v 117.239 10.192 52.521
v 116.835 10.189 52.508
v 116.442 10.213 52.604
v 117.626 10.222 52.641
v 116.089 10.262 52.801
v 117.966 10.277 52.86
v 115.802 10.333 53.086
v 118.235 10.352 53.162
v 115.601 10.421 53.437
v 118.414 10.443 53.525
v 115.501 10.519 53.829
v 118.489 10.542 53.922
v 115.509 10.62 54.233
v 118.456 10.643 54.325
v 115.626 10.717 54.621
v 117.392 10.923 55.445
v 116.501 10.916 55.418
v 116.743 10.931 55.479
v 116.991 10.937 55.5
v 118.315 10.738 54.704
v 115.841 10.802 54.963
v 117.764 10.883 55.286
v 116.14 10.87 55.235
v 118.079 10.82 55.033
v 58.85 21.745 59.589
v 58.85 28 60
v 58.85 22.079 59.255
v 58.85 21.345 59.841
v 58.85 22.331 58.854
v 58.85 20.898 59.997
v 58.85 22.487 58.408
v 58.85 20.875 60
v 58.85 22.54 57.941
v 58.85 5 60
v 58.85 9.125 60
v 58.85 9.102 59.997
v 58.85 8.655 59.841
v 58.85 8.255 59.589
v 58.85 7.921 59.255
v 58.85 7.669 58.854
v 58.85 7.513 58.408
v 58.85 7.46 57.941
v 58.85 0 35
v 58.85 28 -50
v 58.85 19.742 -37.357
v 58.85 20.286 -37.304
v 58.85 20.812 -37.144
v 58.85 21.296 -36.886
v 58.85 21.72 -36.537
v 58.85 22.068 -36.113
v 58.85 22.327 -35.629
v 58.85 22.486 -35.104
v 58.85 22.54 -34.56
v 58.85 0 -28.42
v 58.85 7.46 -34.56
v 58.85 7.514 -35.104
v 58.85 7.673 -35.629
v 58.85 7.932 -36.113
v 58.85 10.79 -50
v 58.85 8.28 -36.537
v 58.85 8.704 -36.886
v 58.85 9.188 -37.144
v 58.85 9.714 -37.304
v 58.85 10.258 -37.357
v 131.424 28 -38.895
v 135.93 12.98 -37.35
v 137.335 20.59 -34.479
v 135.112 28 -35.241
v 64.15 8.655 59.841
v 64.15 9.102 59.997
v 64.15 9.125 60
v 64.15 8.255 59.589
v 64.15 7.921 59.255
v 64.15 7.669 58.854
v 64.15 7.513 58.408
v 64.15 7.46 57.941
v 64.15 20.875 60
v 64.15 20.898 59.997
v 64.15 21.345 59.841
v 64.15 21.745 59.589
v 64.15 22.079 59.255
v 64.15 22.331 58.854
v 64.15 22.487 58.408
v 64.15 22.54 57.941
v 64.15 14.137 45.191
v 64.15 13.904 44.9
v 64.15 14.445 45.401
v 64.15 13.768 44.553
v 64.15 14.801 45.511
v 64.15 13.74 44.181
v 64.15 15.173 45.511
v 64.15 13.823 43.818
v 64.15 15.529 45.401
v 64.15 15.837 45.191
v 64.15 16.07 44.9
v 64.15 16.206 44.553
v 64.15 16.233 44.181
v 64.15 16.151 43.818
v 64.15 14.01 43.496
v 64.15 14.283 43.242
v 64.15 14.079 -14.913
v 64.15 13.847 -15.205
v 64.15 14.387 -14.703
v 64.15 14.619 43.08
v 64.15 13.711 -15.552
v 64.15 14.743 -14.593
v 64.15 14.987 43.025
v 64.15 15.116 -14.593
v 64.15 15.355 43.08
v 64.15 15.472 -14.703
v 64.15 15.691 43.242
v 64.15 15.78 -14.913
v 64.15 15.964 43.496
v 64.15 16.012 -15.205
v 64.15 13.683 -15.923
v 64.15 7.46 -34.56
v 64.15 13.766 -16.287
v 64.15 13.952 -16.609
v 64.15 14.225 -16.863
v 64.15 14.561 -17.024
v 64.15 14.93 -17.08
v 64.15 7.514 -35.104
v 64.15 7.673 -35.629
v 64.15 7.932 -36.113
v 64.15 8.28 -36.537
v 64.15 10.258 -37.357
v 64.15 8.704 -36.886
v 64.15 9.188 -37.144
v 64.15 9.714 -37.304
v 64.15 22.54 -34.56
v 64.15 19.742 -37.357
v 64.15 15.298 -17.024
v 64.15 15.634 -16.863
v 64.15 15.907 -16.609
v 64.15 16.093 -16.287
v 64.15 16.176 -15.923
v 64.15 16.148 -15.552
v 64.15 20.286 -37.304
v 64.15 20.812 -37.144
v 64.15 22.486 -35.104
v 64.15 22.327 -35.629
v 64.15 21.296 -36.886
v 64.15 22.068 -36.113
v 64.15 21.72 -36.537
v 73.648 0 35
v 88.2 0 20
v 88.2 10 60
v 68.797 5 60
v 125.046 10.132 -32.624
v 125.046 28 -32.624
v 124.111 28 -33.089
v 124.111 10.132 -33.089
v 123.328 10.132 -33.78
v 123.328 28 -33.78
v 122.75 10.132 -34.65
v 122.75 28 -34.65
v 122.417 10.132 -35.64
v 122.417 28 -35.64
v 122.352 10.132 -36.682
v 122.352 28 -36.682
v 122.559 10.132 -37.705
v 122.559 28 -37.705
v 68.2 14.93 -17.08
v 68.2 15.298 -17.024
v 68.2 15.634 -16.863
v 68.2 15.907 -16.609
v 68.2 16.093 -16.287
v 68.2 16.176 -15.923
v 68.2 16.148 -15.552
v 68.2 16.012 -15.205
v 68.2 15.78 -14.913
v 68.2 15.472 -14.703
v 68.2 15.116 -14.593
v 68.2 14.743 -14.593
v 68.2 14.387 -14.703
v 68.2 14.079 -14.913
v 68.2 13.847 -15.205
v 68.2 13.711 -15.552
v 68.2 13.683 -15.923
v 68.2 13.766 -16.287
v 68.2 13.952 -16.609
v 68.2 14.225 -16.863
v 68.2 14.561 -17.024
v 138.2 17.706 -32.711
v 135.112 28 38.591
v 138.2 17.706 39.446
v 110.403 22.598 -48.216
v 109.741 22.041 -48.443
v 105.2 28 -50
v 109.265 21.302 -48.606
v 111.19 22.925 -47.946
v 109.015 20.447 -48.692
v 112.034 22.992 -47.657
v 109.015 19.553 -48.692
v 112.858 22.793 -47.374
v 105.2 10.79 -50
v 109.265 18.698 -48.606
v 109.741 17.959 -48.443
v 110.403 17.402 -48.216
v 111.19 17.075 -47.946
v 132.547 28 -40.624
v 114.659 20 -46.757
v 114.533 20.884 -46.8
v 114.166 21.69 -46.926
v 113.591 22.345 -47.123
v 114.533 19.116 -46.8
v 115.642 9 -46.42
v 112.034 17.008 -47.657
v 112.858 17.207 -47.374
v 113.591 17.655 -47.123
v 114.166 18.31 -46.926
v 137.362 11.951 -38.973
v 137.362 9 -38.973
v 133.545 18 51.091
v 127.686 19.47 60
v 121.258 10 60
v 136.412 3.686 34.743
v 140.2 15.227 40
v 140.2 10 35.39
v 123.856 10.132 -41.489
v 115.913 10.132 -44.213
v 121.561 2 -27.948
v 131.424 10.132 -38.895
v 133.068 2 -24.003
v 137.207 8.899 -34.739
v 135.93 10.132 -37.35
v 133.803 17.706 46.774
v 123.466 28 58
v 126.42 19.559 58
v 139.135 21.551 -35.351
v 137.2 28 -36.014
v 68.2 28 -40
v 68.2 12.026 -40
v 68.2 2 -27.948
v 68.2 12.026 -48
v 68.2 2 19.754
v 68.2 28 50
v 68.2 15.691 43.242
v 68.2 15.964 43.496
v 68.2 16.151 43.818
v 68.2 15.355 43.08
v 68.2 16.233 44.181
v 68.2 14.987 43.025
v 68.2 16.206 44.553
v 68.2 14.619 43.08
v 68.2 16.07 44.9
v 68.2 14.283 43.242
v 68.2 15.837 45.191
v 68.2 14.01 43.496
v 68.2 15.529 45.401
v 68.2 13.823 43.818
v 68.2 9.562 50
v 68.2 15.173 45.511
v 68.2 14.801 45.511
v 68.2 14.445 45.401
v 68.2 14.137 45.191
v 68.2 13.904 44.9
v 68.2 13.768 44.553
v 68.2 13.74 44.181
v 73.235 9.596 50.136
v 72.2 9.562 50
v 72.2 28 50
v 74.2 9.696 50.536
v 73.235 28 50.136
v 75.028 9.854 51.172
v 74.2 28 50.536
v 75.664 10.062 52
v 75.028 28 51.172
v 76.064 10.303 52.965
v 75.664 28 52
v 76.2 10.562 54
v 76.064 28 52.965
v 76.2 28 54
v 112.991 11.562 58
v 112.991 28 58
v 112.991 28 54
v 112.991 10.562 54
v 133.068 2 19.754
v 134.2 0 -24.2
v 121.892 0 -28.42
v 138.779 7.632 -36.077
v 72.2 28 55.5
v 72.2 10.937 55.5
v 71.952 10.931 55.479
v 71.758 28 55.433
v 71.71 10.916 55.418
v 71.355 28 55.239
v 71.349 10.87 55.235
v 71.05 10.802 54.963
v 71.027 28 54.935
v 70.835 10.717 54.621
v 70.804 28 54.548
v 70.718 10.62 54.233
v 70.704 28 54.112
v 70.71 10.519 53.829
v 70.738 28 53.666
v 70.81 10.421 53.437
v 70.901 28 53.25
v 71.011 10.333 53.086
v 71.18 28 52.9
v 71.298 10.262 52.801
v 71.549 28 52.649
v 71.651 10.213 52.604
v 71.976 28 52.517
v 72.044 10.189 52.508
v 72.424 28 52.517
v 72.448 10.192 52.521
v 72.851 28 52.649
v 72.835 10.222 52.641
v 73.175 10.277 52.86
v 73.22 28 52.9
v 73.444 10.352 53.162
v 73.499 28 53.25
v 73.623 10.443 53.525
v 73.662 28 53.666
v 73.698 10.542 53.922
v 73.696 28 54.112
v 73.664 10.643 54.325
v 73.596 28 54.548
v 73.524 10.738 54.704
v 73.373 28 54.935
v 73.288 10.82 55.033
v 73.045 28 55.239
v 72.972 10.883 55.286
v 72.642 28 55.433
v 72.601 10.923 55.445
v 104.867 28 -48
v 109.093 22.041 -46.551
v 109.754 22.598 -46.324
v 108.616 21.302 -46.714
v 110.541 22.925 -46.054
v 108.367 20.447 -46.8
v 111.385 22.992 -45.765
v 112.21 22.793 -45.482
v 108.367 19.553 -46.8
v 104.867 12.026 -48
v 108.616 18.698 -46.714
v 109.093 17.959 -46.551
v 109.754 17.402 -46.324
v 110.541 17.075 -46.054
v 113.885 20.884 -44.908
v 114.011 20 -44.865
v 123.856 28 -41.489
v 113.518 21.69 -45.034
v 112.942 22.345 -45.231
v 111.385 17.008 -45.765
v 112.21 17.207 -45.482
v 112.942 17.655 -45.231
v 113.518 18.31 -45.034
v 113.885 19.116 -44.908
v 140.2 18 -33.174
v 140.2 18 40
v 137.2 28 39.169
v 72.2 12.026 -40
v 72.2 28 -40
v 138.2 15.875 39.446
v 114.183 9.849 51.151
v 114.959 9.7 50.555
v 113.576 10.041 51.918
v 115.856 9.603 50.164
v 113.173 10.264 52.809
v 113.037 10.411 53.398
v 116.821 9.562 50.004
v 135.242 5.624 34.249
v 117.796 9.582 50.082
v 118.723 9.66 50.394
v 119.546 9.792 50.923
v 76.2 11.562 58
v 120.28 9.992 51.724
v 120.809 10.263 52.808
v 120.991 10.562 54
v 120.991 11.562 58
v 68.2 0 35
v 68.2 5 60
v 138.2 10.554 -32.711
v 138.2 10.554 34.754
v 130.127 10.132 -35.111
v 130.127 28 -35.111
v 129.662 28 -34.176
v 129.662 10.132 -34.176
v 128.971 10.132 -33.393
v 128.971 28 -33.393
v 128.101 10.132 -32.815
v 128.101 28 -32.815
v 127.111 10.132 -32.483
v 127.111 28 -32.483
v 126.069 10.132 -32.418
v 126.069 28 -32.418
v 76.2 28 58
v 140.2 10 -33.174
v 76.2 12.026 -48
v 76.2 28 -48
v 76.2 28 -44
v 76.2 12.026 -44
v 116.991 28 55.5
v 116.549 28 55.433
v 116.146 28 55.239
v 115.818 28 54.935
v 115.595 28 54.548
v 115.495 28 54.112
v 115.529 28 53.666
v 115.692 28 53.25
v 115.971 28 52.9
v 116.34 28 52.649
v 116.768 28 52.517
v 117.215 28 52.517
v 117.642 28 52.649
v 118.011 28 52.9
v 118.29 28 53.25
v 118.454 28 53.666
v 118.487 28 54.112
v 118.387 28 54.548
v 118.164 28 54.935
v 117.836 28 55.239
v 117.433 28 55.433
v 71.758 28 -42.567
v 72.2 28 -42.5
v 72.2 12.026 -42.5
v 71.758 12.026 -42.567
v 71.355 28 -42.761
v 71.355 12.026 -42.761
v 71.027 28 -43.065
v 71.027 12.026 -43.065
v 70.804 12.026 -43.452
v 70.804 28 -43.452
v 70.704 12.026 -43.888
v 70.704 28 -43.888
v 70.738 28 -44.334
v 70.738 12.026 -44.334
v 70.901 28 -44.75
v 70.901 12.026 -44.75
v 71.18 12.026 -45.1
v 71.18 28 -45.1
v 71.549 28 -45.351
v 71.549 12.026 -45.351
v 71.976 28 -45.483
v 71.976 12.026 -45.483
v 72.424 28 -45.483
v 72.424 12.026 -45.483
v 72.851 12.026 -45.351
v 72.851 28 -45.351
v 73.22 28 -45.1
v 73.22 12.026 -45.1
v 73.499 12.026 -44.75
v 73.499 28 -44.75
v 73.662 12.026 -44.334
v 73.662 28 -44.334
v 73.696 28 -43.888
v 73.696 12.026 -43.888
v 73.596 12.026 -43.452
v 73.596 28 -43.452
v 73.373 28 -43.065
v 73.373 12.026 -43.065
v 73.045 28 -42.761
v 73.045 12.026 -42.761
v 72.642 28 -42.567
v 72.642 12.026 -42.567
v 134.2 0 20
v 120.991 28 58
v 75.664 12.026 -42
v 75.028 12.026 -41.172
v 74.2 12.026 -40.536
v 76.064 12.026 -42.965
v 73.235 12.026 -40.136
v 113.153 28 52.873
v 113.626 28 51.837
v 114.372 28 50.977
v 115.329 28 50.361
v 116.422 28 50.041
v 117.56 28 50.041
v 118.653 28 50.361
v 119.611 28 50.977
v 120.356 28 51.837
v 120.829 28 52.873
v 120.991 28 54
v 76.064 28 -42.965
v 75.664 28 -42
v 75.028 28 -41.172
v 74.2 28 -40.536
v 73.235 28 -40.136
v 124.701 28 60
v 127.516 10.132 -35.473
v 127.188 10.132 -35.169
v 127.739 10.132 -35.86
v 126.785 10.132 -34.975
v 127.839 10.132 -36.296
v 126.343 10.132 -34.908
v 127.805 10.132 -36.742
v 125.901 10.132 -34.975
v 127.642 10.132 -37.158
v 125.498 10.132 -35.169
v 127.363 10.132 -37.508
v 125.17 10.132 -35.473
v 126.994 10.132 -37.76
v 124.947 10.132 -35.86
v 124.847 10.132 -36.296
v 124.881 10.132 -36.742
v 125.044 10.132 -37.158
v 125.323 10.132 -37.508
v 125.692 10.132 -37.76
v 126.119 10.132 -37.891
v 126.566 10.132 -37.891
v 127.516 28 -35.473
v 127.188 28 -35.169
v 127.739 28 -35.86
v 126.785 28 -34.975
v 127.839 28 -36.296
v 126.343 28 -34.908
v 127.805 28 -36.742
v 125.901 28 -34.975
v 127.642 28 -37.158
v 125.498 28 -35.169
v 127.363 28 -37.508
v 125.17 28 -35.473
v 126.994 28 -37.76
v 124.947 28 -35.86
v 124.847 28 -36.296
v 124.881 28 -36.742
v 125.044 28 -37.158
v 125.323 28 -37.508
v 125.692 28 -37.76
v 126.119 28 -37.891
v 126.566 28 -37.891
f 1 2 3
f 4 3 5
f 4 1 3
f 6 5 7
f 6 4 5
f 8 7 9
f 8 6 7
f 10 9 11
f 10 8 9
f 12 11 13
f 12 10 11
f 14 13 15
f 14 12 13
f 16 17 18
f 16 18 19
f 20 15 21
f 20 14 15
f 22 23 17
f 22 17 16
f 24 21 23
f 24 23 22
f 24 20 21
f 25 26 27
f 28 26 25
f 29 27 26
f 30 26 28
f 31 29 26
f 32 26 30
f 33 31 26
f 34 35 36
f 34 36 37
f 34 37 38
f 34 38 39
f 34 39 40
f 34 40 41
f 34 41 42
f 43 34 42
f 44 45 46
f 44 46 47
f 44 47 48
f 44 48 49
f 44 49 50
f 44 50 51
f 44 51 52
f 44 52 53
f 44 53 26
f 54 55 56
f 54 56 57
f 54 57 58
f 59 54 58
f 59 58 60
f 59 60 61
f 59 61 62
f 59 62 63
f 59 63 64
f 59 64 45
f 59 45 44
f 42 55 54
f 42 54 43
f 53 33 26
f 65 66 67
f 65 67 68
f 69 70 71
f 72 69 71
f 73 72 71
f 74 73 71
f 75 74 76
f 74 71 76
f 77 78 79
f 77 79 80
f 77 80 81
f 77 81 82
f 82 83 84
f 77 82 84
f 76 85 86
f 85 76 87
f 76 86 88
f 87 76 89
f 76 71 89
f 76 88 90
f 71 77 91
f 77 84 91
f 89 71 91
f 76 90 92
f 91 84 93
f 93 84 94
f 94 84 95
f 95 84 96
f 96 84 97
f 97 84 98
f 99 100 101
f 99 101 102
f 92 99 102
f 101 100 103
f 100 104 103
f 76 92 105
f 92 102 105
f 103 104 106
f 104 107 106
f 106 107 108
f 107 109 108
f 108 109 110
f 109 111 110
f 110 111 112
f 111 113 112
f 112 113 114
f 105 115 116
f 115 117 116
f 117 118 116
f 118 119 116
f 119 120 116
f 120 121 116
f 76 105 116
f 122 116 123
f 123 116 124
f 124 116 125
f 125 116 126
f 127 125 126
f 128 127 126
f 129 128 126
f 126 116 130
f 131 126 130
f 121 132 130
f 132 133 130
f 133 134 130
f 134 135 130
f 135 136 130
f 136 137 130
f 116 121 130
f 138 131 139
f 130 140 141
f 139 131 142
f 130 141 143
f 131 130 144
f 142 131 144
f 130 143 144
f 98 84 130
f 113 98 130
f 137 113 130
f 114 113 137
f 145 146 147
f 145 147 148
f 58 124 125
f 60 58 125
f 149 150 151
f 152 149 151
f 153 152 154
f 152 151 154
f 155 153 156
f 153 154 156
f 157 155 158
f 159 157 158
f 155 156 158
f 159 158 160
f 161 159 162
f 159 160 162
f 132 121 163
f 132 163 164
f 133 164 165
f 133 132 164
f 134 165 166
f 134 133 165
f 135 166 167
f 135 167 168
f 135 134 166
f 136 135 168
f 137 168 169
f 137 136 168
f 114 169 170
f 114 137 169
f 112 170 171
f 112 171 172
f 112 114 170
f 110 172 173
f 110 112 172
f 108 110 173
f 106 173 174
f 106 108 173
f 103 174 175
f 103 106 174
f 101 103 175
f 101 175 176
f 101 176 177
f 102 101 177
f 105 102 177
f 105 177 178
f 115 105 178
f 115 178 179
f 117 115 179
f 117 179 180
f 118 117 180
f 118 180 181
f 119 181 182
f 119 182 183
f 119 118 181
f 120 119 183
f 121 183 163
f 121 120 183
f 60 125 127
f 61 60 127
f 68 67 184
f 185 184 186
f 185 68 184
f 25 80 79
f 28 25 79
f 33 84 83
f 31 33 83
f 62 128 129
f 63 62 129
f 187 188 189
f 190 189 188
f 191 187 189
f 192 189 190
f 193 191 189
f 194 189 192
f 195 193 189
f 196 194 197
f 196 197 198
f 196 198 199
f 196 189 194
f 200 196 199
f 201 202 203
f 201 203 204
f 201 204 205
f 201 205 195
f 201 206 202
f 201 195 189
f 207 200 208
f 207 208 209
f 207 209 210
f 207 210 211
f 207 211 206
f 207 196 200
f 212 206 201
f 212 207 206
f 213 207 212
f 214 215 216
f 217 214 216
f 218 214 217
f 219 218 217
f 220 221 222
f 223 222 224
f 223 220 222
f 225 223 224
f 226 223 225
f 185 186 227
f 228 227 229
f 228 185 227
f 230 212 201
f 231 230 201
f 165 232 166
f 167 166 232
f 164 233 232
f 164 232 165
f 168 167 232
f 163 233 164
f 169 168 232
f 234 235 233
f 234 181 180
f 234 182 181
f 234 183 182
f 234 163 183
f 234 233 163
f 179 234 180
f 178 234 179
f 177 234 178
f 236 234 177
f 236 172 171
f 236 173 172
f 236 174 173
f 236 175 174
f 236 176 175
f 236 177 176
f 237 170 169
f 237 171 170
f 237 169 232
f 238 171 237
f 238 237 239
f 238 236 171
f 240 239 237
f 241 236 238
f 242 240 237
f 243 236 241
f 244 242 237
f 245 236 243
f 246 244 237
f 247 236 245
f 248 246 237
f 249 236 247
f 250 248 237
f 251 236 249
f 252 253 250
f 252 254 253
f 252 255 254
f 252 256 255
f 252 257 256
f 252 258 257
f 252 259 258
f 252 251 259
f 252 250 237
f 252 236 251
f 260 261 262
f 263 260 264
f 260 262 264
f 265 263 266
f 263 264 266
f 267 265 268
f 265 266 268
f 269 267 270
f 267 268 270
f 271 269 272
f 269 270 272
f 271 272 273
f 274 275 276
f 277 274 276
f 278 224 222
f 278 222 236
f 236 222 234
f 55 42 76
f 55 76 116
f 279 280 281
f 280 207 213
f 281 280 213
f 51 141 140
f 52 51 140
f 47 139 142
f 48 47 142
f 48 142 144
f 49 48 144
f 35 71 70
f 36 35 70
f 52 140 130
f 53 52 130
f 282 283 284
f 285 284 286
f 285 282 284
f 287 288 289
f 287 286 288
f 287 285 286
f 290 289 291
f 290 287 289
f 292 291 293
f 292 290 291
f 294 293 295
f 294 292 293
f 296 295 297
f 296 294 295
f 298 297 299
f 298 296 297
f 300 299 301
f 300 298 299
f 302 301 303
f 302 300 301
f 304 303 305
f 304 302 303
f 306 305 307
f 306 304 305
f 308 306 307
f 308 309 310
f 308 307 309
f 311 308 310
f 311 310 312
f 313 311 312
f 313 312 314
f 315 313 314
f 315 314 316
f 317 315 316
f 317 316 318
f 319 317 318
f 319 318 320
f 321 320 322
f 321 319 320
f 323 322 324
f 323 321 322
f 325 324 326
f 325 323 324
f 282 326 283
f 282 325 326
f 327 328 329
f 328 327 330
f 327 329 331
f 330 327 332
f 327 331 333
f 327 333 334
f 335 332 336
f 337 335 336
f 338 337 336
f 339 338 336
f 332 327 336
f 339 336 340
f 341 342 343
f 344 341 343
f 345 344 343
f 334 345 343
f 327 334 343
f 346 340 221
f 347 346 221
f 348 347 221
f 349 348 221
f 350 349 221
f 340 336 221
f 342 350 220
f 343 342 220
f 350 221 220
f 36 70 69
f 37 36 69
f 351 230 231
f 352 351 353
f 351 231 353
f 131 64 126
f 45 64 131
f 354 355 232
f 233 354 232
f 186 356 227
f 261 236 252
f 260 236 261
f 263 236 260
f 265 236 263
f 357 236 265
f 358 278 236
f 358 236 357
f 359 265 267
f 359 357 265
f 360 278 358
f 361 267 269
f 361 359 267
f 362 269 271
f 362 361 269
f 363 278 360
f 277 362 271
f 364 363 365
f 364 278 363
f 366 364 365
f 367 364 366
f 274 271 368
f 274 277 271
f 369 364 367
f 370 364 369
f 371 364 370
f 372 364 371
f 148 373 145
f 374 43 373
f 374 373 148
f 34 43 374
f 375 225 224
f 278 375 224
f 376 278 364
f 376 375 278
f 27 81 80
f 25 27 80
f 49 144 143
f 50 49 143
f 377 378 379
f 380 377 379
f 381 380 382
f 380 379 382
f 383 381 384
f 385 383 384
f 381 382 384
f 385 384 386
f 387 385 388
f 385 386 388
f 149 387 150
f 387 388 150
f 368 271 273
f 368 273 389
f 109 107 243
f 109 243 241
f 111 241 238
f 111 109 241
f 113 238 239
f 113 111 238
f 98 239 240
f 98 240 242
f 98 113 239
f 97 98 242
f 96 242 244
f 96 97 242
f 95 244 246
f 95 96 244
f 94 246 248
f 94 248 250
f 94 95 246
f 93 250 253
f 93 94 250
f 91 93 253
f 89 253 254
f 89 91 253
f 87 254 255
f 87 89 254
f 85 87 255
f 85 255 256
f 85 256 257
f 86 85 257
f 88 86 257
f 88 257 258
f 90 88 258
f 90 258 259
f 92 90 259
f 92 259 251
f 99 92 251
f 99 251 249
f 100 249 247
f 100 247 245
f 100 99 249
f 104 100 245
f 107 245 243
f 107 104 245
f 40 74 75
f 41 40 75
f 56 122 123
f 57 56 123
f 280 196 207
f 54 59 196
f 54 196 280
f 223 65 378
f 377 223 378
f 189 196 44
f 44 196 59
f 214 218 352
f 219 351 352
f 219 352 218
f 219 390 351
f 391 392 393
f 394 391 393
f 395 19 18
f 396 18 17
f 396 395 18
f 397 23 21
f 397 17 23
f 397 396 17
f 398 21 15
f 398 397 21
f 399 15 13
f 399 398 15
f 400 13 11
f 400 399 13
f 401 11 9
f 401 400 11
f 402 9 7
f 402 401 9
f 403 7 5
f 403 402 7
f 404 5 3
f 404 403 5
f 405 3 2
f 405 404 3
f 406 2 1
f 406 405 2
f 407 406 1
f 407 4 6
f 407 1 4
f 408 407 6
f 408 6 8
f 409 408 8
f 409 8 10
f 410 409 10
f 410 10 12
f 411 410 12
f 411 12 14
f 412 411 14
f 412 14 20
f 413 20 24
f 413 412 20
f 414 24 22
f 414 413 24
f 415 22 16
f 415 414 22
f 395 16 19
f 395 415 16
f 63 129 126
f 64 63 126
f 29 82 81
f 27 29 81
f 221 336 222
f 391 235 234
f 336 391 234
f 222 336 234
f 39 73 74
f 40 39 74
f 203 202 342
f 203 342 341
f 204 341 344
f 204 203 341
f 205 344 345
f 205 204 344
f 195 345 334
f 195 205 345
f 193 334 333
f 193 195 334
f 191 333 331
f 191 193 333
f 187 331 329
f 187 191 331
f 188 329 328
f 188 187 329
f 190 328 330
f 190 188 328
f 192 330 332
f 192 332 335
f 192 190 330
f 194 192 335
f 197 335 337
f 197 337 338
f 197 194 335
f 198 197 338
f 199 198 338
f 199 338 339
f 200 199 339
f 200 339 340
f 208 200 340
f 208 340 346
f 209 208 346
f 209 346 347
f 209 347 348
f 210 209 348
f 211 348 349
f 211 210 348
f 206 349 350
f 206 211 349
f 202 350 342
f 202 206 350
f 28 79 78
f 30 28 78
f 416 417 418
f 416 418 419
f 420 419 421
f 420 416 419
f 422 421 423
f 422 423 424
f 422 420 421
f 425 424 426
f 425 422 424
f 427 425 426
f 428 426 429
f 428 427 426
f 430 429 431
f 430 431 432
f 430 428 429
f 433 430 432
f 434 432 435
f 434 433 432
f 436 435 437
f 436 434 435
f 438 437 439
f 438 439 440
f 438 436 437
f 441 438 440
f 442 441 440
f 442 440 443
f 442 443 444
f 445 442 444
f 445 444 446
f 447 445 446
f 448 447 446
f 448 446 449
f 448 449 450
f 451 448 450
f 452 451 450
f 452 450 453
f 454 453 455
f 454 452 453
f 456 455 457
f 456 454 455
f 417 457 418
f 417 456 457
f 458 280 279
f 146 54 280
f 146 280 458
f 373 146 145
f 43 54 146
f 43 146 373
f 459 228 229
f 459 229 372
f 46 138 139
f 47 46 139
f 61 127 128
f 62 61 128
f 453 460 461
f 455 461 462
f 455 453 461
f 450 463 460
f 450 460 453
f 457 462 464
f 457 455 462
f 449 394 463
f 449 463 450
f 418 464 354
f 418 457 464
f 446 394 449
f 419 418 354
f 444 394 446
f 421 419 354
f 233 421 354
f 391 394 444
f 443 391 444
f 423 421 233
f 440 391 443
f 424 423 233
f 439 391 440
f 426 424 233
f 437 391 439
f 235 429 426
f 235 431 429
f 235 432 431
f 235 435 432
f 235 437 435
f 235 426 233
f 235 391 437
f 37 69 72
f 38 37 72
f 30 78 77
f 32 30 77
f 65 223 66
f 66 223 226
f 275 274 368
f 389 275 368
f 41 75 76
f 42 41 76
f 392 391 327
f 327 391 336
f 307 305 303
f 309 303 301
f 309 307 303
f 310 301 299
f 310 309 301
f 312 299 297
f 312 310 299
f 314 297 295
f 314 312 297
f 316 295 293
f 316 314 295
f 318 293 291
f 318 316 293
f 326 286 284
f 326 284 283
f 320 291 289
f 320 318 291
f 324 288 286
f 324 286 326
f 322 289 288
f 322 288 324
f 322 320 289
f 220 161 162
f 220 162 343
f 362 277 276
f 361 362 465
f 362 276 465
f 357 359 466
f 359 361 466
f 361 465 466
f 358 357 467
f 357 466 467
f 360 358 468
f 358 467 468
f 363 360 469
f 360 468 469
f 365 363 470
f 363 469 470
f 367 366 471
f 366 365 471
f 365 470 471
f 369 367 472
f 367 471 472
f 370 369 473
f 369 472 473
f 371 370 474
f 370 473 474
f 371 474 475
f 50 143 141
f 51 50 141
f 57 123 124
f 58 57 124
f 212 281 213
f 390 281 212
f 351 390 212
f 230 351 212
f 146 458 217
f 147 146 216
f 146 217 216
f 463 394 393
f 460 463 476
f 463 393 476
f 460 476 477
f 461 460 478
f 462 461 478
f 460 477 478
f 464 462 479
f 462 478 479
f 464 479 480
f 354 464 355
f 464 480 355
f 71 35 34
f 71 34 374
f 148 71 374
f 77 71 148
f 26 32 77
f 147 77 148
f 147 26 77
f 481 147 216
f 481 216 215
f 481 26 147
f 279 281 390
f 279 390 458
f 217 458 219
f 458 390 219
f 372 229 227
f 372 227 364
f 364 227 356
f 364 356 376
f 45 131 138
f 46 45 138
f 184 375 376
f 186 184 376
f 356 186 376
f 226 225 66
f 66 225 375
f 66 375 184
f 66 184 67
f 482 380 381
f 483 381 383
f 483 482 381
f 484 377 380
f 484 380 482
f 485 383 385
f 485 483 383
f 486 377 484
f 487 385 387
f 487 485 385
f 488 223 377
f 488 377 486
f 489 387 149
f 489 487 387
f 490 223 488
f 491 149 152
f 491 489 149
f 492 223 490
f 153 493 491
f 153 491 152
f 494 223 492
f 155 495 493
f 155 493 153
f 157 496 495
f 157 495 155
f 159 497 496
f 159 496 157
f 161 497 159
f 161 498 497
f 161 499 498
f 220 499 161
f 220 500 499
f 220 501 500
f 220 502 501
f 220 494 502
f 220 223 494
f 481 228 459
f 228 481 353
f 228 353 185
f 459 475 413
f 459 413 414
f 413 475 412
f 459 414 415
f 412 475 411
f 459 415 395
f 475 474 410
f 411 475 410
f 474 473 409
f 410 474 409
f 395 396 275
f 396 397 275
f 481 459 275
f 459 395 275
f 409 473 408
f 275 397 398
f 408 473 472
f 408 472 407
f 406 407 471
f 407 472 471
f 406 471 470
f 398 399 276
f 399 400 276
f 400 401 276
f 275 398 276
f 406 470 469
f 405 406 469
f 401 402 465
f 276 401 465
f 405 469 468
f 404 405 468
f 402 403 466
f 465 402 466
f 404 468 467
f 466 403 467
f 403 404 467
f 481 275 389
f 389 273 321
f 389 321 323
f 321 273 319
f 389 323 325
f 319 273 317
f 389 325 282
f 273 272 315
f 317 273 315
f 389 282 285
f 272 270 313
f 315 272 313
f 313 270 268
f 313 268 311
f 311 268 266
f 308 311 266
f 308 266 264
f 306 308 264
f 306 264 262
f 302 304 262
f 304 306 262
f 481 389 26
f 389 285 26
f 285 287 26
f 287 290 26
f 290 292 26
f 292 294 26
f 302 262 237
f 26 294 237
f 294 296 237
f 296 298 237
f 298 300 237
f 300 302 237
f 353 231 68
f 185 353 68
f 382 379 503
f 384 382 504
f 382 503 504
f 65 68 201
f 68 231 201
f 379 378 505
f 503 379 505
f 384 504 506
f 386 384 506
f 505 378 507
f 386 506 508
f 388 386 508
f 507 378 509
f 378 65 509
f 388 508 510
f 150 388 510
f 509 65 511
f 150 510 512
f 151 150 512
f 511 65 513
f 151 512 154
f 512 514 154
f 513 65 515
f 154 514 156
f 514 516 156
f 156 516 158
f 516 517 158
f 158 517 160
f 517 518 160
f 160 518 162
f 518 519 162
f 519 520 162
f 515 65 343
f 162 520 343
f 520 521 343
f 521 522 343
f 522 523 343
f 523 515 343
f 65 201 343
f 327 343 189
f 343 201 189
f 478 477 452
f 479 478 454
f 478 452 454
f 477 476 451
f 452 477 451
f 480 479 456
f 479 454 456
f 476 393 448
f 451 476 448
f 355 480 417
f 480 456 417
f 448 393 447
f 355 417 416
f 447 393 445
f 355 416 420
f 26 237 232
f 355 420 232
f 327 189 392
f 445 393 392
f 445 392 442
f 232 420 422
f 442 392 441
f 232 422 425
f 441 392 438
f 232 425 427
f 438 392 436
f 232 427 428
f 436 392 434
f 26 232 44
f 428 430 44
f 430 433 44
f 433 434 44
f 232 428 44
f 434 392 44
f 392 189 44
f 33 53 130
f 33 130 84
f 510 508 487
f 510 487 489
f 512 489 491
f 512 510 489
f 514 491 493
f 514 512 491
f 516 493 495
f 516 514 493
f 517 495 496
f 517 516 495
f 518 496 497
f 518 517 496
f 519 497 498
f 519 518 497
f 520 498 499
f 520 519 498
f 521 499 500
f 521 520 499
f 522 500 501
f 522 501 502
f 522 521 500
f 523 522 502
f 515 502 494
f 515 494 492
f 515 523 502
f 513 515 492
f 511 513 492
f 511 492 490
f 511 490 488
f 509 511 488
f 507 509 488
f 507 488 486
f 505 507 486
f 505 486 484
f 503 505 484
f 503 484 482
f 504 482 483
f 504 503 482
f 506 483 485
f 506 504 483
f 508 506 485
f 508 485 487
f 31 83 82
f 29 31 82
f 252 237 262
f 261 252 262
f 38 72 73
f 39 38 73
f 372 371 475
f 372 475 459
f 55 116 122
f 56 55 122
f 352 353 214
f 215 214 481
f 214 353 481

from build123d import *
from OCP.BRepFilletAPI import BRepFilletAPI_MakeChamfer

# Parameters (mm, degrees)
SKETCH1_W               = 55
SKETCH1_H               = 60
BOSS_EXTRUDE1_DEPTH     = 28
CHAMFER5_SIZE           = 15
CHAMFER5_SIZE2          = 9
CUT_EXTRUDE3_DEPTH      = 98.816154085
CUT_EXTRUDE5_DEPTH      = 98.816154085
CHAMFER2_SIZE           = 6
CHAMFER2_SIZE2          = 10
CHAMFER2_PART_2_SIZE    = 6
CHAMFER2_PART_2_SIZE2   = 10
CHAMFER3_SIZE           = 10
CHAMFER3_SIZE2          = 3
CHAMFER8_SIZE           = 3
CHAMFER8_SIZE2          = 4.688384964
CHAMFER8_SIZE2_2        = 4.826086957
SHELL1_T                = -2
SKETCH1_3_W             = 9.35
SKETCH1_3_H             = 100
SKETCH1_3_H_2           = 10
BOSS_EXTRUDE2_DEPTH     = 28
CUT_EXTRUDE1_DEPTH      = 5.3
CUT_EXTRUDE_THIN1_DEPTH = 5.3
SKETCH4_R               = 1.250001298
SKETCH4_R_2             = 1.250245712
CUT_EXTRUDE2_DEPTH      = 4.05
CUT_EXTRUDE4_DEPTH      = 9.35
CUT_EXTRUDE6_DEPTH      = 98.816154085
CHAMFER6_SIZE           = 20
CHAMFER6_SIZE_2         = 5
SKETCH10_R              = 3
CUT_EXTRUDE7_DEPTH      = 2
SKETCH12_R              = 1.5
BOSS_EXTRUDE3_DEPTH     = 18.45
SKETCH12_4_R            = 1.5
BOSS_EXTRUDE4_DEPTH     = 15.973931
SKETCH12_5_R            = 1.5
BOSS_EXTRUDE5_DEPTH     = 17.86762


with BuildPart() as part:
    # Sketch1 → Boss-Extrude1 (new body)
    # profile 1 of 2: a face of its own
    with BuildSketch(Plane(origin=(0, 0, 0), x_dir=(1, 0, 0), z_dir=(0, 1, 0))):
        Polygon((29.5, 50), (-7.5, 50), (-42.5, 38), (-42.5, -40), (-30.5, -60), (29.5, -60), (29.5, -50), align=None)
        Rectangle(SKETCH1_W, SKETCH1_H, mode=Mode.SUBTRACT)
    # profile 2 of 2: a face of its own
    with BuildSketch(Plane(origin=(0, 0, 0), x_dir=(1, 0, 0), z_dir=(0, 1, 0))):
        Rectangle(SKETCH1_W, SKETCH1_H)
    extrude(amount=BOSS_EXTRUDE1_DEPTH)

    # Chamfer5
    chamfer5_edges = [part.edges().sort_by_distance(p)[0] for p in [
        (-25, 0, -44),
    ]]
    chamfer5_side = [part.faces().sort_by_distance(p)[0] for p in [
        (-5.320816864, 0, 5.646903821),
    ]]
    chamfer(chamfer5_edges, length=CHAMFER5_SIZE, length2=CHAMFER5_SIZE2, reference=chamfer5_side[0])

    # Sketch6 → Cut-Extrude3 (cut, through all)
    with BuildSketch(Plane(origin=(29.5, 0, 0), x_dir=(0, 0, -1), z_dir=(1, 0, 0))):
        Polygon((28.599998808, 0.090000199), (38.599998808, 5.090000199), (50, 10.790000795), (50, 0), (28.41999841, 0), align=None)
    extrude(amount=-CUT_EXTRUDE3_DEPTH, mode=Mode.SUBTRACT)

    # Sketch8 → Cut-Extrude5 (cut, through all)
    with BuildSketch(Plane.ZY.offset(42.5)):
        Polygon((20, 0), (60, 10), (60, 0), align=None)
    extrude(amount=-CUT_EXTRUDE5_DEPTH, mode=Mode.SUBTRACT)

    # Chamfer2
    chamfer2_edges = [part.edges().sort_by_distance(p)[0] for p in [
        (-42.5, 0, -1.071428571),
    ]]
    chamfer2_side = [part.faces().sort_by_distance(p)[0] for p in [
        (-5.998960327, 0, -3.839335876),
    ]]
    chamfer(chamfer2_edges, length=CHAMFER2_SIZE, length2=CHAMFER2_SIZE2, reference=chamfer2_side[0])

    # Chamfer2 part 2
    chamfer2_part_2_edges = [part.edges().sort_by_distance(p)[0] for p in [
        (-36.5, 7.5, 50),
    ]]
    chamfer2_part_2_side = [part.faces().sort_by_distance(p)[0] for p in [
        (-5.108695652, 4.855072464, 39.420289855),
    ]]
    chamfer(chamfer2_part_2_edges, length=CHAMFER2_PART_2_SIZE, length2=CHAMFER2_PART_2_SIZE2, reference=chamfer2_part_2_side[0])

    # Chamfer3: one chamfer whose edges measure the first distance from different faces: ONE call of the kernel's chamfer builder (chamfer() names one face for all edges)
    chamfer3_edges_1 = [part.edges().sort_by_distance(p)[0] for p in [
        (-36.5, 28, 50),
    ]]
    chamfer3_side_1 = [part.faces().sort_by_distance(p)[0] for p in [
        (-36.986722145, 22.762198781, 49.188796426),
    ]]
    chamfer3_edges_2 = [part.edges().sort_by_distance(p)[0] for p in [
        (-42.5, 28, 1),
    ]]
    chamfer3_side_2 = [part.faces().sort_by_distance(p)[0] for p in [
        (-42.5, 19.062821539, 0.675718674),
    ]]
    chamfer3 = BRepFilletAPI_MakeChamfer(part.part.solid().wrapped)
    for e in chamfer3_edges_1:
        chamfer3.Add(CHAMFER3_SIZE, CHAMFER3_SIZE2, e.wrapped, chamfer3_side_1[0].wrapped)  # the first distance lies on this face
    for e in chamfer3_edges_2:
        chamfer3.Add(CHAMFER3_SIZE, CHAMFER3_SIZE2, e.wrapped, chamfer3_side_2[0].wrapped)  # the first distance lies on this face
    add(Compound.cast(chamfer3.Shape()), mode=Mode.REPLACE)

    # Chamfer8: one chamfer whose edges measure the first distance from different faces: ONE call of the kernel's chamfer builder (chamfer() names one face for all edges)
    chamfer8_edges_1 = [part.edges().sort_by_distance(p)[0] for p in [
        (-41, 23, -38.514285714),
    ]]
    chamfer8_side_1 = [part.faces().sort_by_distance(p)[0] for p in [
        (-40.999367405, 23.002108649, 0.534923115),
    ]]
    chamfer8_edges_2 = [part.edges().sort_by_distance(p)[0] for p in [
        (-42.5, 14, -38),
    ]]
    chamfer8_side_2 = [part.faces().sort_by_distance(p)[0] for p in [
        (-24.809989525, 18.489778037, -44.065146449),
    ]]
    chamfer8 = BRepFilletAPI_MakeChamfer(part.part.solid().wrapped)
    for e in chamfer8_edges_1:
        chamfer8.Add(CHAMFER8_SIZE, CHAMFER8_SIZE2, e.wrapped, chamfer8_side_1[0].wrapped)  # the first distance lies on this face
    for e in chamfer8_edges_2:
        chamfer8.Add(CHAMFER8_SIZE, CHAMFER8_SIZE2_2, e.wrapped, chamfer8_side_2[0].wrapped)  # the first distance lies on this face
    add(Compound.cast(chamfer8.Shape()), mode=Mode.REPLACE)

    # Shell1
    shell1_openings = [part.faces().sort_by_distance(p)[0] for p in [
        (-3.850715667, 28, 5.420818652),
        (29.5, 15.210219058, 3.998585691),
    ]]
    offset(amount=SHELL1_T, openings=shell1_openings, kind=Kind.INTERSECTION)

    # Sketch1<3> → Boss-Extrude2 (add)
    with BuildSketch(Plane(origin=(0, 0, 0), x_dir=(1, 0, 0), z_dir=(0, 1, 0))):
        with Locations((34.175, 0)):
            Rectangle(SKETCH1_3_W, SKETCH1_3_H)
        with Locations((34.175, -55)):
            Rectangle(SKETCH1_3_W, SKETCH1_3_H_2)
    extrude(amount=BOSS_EXTRUDE2_DEPTH)

    # Sketch3 → Cut-Extrude1 (cut)
    with BuildSketch(Plane(origin=(38.85, 0, 0), x_dir=(0, 0, -1), z_dir=(1, 0, 0))):
        Polygon((34.557366217, 22.490000211), (-57.938007116, 22.490000211), (-58.396836221, 22.438301563), (-58.832665384, 22.285797958), (-59.223634601, 22.040136716), (-59.550133944, 21.713636209), (-59.795801938, 21.322668447), (-59.948307872, 20.886838382), (-60, 20.4280002), (-60, 9.572000334), (-59.948307872, 9.113161916), (-59.795801938, 8.677331822), (-59.550133944, 8.286364468), (-59.223634601, 7.959863262), (-58.832665384, 7.714202719), (-58.396836221, 7.561698647), (-57.938007116, 7.51), (34.557366217, 7.51), (35.093864598, 7.56284138), (35.609745709, 7.719331512), (36.08518437, 7.973458709), (36.501909895, 8.315457123), (36.84390761, 8.732182065), (37.098034807, 9.207620377), (37.254525637, 9.723501371), (37.307366086, 10.259999985), (37.307366086, 19.740000226), (37.254525637, 20.276498578), (37.098034807, 20.79237963), (36.84390761, 21.267818379), (36.501909895, 21.684543903), (36.08518437, 22.026541618), (35.609745709, 22.280668931), (35.093864598, 22.437159762), align=None)
    extrude(amount=-CUT_EXTRUDE1_DEPTH, mode=Mode.SUBTRACT)

    # Sketch3<2> → Cut-Extrude-Thin1 (cut)
    with BuildSketch(Plane(origin=(38.85, 0, 0), x_dir=(0, 0, -1), z_dir=(1, 0, 0))):
        Polygon((-58.408032741, 22.487356385), (-58.854496816, 22.331131453), (-59.255006355, 22.079475653), (-59.589472678, 21.745008138), (-59.84113526, 21.344500303), (-59.997362817, 20.898034618), (-60.05, 20.430807788), (-60.05, 9.569192748), (-59.997362818, 9.101965682), (-59.841135257, 8.655499956), (-59.589472684, 8.254992553), (-59.255006355, 7.920524316), (-58.854496805, 7.668869226), (-58.408032765, 7.512643829), (-57.940815111, 7.46), (34.559822602, 7.46), (35.103666322, 7.513564845), (35.628972433, 7.672914008), (36.113097308, 7.931684081), (36.537436306, 8.279930722), (36.885682237, 8.704269129), (37.144452294, 9.188393617), (37.303802182, 9.713699658), (37.357366086, 10.257543645), (37.357366086, 19.742456567), (37.303802182, 20.286300291), (37.144452297, 20.811606381), (36.885682251, 21.295731292), (36.537436304, 21.720070312), (36.113097289, 22.068316255), (35.628972465, 22.32708642), (35.103666311, 22.486436306), (34.559822559, 22.540000211), (-57.940815111, 22.540000211), align=None)
        Polygon((-58.396836221, 22.438301563), (-58.832665384, 22.285797958), (-59.223634601, 22.040136716), (-59.550133944, 21.713636209), (-59.795801938, 21.322668447), (-59.948307872, 20.886838382), (-60, 20.4280002), (-60, 9.572000334), (-59.948307872, 9.113161916), (-59.795801938, 8.677331822), (-59.550133944, 8.286364468), (-59.223634601, 7.959863262), (-58.832665384, 7.714202719), (-58.396836221, 7.561698647), (-57.938007116, 7.51), (34.557366217, 7.51), (35.093864598, 7.56284138), (35.609745709, 7.719331512), (36.08518437, 7.973458709), (36.501909895, 8.315457123), (36.84390761, 8.732182065), (37.098034807, 9.207620377), (37.254525637, 9.723501371), (37.307366086, 10.259999985), (37.307366086, 19.740000226), (37.254525637, 20.276498578), (37.098034807, 20.79237963), (36.84390761, 21.267818379), (36.501909895, 21.684543903), (36.08518437, 22.026541618), (35.609745709, 22.280668931), (35.093864598, 22.437159762), (34.557366217, 22.490000211), (-57.938007116, 22.490000211), align=None, mode=Mode.SUBTRACT)
    extrude(amount=-CUT_EXTRUDE_THIN1_DEPTH, mode=Mode.SUBTRACT)

    # Sketch4 → Cut-Extrude2 (cut)
    with BuildSketch(Plane(origin=(33.55, 0, 0), x_dir=(0, 0, -1), z_dir=(1, 0, 0))):
        with Locations((-44.274877957, 14.986979658)):
            Circle(SKETCH4_R)
        with Locations((15.829750418, 14.92958888)):
            Circle(SKETCH4_R_2)
    extrude(amount=-CUT_EXTRUDE2_DEPTH, mode=Mode.SUBTRACT)

    # Sketch7 → Cut-Extrude4 (cut)
    with BuildSketch(Plane.ZY.offset(-29.5)):
        Polygon((-28.41999841, 0), (-50, 10.790000795), (-50, 0), align=None)
    extrude(amount=-CUT_EXTRUDE4_DEPTH, mode=Mode.SUBTRACT)

    # Sketch9 → Cut-Extrude6 (cut, through all)
    with BuildSketch(Plane.ZY.offset(-29.5)):
        Polygon((60, 0), (60, 5), (35, 0), align=None)
    extrude(amount=-CUT_EXTRUDE6_DEPTH, mode=Mode.SUBTRACT)

    # Chamfer6
    # the kernel refuses this chamfer: 20, 5 mm, written as the material it adds along each edge
    with BuildSketch(Plane(origin=(29.5, -12.597918829, -30.391675317), x_dir=(-0.9999563942249224, 0.009059783074481399, -0.0022649457686203496), z_dir=(0, 0.24253562503633297, 0.9701425001453319))) as chamfer6_piece_1_section:
        Polygon((CHAMFER6_SIZE * 0.999956394225, CHAMFER6_SIZE * 0.00933861064032), (-CHAMFER6_SIZE_2 * 0.00933861064032, CHAMFER6_SIZE_2 * 0.999956394225), (0, 0), align=None)
    chamfer6_piece_1 = extrude(amount=145.116156247, mode=Mode.PRIVATE)
    chamfer6_piece_1 = split(chamfer6_piece_1, bisect_by=Plane(origin=(21.891274925, 0, 42.504406507), z_dir=(0, 1, 0)), keep=Keep.TOP, mode=Mode.PRIVATE)
    chamfer6_piece_1 = split(chamfer6_piece_1, bisect_by=Plane(origin=(21.891274925, 4.42094487, 60), z_dir=(0, 0, -1)), keep=Keep.TOP, mode=Mode.PRIVATE)
    chamfer6_piece_1 = split(chamfer6_piece_1, bisect_by=Plane(origin=(21.891274925, 1.613191439, 43.065957193), z_dir=(0, 0.9805806756909202, -0.19611613513818396)), keep=Keep.TOP, mode=Mode.PRIVATE)
    add(chamfer6_piece_1)

    # Sketch10 → Cut-Extrude7 (cut)
    with BuildSketch(Plane(origin=(-16.128560993, 0, -47.041636231), x_dir=(-0.9459459459459459, 0, 0.3243243243243241), z_dir=(-0.3243243243243242, 0, -0.945945945945946))):
        with Locations((-2.121621622, 20)):
            Circle(SKETCH10_R)
    extrude(amount=-CUT_EXTRUDE7_DEPTH, mode=Mode.SUBTRACT)

    # Sketch12 → Boss-Extrude3 (add)
    # profile 1 of 2: a face of its own
    with BuildSketch(Plane(origin=(0, 28, 0), x_dir=(1, 0, 0), z_dir=(0, 1, 0))):
        with BuildLine():
            Line((21.5, -58), (29.5, -58))
            Line((29.5, -58), (29.5, -50))
            Line((29.5, -50), (25.5, -50))
            ThreePointArc((25.5, -50), (22.671572875, -51.171572875), (21.5, -54))
            Line((21.5, -54), (21.5, -58))
        make_face()
        with Locations(Location((25.5, -54, 0), (0, 0, 270))):
            Circle(SKETCH12_R, mode=Mode.SUBTRACT)
    # profile 2 of 2: a face of its own
    with BuildSketch(Plane(origin=(0, 28, 0), x_dir=(1, 0, 0), z_dir=(0, 1, 0))):
        with BuildLine():
            Line((-23.291144984, -58), (-15.291144984, -58))
            Line((-15.291144984, -58), (-15.291144984, -54))
            ThreePointArc((-15.291144984, -54), (-19.291144984, -50), (-23.291144984, -54))
            Line((-23.291144984, -54), (-23.291144984, -58))
        make_face()
        with Locations(Location((-19.291144984, -54, 0), (0, 0, 270))):
            Circle(SKETCH12_R, mode=Mode.SUBTRACT)
    extrude(amount=-BOSS_EXTRUDE3_DEPTH)

    # Sketch12<4> → Boss-Extrude4 (add)
    with BuildSketch(Plane(origin=(0, 28, 0), x_dir=(1, 0, 0), z_dir=(0, 1, 0))):
        with BuildLine():
            Line((29.5, 40), (29.5, 48))
            Line((29.5, 48), (21.5, 48))
            Line((21.5, 48), (21.5, 44))
            ThreePointArc((21.5, 44), (22.671572875, 41.171572875), (25.5, 40))
            Line((25.5, 40), (29.5, 40))
        make_face()
        with Locations(Location((25.5, 44, 0), (0, 0, 270))):
            Circle(SKETCH12_4_R, mode=Mode.SUBTRACT)
    extrude(amount=-BOSS_EXTRUDE4_DEPTH)

    # Sketch12<5> → Boss-Extrude5 (add)
    with BuildSketch(Plane(origin=(0, 28, 0), x_dir=(1, 0, 0), z_dir=(0, 1, 0))):
        with BuildLine():
            Line((-26.156435162, 41.48922223), (-33.72400273, 38.894627636))
            Line((-33.72400273, 38.894627636), (-32.426705432, 35.110843852))
            ThreePointArc((-32.426705432, 35.110843852), (-30.401133137, 32.815274277), (-27.34562442, 32.624357342))
            ThreePointArc((-27.34562442, 32.624357342), (-25.050054776, 34.649929661), (-24.859137865, 37.705438446))
            Line((-24.859137865, 37.705438446), (-26.156435162, 41.48922223))
        make_face()
        with Locations(Location((-28.642921649, 36.408141149, 0), (0, 0, 270))):
            Circle(SKETCH12_5_R, mode=Mode.SUBTRACT)
    extrude(amount=-BOSS_EXTRUDE5_DEPTH)


with BuildPart() as body_2:
    # Mirror1: mirrored copy
    add(part.part.mirror(Plane(origin=(48.85, 0, 0), x_dir=(0, 0, 1), z_dir=(1, 0, 0))))


solid = body_2.part
